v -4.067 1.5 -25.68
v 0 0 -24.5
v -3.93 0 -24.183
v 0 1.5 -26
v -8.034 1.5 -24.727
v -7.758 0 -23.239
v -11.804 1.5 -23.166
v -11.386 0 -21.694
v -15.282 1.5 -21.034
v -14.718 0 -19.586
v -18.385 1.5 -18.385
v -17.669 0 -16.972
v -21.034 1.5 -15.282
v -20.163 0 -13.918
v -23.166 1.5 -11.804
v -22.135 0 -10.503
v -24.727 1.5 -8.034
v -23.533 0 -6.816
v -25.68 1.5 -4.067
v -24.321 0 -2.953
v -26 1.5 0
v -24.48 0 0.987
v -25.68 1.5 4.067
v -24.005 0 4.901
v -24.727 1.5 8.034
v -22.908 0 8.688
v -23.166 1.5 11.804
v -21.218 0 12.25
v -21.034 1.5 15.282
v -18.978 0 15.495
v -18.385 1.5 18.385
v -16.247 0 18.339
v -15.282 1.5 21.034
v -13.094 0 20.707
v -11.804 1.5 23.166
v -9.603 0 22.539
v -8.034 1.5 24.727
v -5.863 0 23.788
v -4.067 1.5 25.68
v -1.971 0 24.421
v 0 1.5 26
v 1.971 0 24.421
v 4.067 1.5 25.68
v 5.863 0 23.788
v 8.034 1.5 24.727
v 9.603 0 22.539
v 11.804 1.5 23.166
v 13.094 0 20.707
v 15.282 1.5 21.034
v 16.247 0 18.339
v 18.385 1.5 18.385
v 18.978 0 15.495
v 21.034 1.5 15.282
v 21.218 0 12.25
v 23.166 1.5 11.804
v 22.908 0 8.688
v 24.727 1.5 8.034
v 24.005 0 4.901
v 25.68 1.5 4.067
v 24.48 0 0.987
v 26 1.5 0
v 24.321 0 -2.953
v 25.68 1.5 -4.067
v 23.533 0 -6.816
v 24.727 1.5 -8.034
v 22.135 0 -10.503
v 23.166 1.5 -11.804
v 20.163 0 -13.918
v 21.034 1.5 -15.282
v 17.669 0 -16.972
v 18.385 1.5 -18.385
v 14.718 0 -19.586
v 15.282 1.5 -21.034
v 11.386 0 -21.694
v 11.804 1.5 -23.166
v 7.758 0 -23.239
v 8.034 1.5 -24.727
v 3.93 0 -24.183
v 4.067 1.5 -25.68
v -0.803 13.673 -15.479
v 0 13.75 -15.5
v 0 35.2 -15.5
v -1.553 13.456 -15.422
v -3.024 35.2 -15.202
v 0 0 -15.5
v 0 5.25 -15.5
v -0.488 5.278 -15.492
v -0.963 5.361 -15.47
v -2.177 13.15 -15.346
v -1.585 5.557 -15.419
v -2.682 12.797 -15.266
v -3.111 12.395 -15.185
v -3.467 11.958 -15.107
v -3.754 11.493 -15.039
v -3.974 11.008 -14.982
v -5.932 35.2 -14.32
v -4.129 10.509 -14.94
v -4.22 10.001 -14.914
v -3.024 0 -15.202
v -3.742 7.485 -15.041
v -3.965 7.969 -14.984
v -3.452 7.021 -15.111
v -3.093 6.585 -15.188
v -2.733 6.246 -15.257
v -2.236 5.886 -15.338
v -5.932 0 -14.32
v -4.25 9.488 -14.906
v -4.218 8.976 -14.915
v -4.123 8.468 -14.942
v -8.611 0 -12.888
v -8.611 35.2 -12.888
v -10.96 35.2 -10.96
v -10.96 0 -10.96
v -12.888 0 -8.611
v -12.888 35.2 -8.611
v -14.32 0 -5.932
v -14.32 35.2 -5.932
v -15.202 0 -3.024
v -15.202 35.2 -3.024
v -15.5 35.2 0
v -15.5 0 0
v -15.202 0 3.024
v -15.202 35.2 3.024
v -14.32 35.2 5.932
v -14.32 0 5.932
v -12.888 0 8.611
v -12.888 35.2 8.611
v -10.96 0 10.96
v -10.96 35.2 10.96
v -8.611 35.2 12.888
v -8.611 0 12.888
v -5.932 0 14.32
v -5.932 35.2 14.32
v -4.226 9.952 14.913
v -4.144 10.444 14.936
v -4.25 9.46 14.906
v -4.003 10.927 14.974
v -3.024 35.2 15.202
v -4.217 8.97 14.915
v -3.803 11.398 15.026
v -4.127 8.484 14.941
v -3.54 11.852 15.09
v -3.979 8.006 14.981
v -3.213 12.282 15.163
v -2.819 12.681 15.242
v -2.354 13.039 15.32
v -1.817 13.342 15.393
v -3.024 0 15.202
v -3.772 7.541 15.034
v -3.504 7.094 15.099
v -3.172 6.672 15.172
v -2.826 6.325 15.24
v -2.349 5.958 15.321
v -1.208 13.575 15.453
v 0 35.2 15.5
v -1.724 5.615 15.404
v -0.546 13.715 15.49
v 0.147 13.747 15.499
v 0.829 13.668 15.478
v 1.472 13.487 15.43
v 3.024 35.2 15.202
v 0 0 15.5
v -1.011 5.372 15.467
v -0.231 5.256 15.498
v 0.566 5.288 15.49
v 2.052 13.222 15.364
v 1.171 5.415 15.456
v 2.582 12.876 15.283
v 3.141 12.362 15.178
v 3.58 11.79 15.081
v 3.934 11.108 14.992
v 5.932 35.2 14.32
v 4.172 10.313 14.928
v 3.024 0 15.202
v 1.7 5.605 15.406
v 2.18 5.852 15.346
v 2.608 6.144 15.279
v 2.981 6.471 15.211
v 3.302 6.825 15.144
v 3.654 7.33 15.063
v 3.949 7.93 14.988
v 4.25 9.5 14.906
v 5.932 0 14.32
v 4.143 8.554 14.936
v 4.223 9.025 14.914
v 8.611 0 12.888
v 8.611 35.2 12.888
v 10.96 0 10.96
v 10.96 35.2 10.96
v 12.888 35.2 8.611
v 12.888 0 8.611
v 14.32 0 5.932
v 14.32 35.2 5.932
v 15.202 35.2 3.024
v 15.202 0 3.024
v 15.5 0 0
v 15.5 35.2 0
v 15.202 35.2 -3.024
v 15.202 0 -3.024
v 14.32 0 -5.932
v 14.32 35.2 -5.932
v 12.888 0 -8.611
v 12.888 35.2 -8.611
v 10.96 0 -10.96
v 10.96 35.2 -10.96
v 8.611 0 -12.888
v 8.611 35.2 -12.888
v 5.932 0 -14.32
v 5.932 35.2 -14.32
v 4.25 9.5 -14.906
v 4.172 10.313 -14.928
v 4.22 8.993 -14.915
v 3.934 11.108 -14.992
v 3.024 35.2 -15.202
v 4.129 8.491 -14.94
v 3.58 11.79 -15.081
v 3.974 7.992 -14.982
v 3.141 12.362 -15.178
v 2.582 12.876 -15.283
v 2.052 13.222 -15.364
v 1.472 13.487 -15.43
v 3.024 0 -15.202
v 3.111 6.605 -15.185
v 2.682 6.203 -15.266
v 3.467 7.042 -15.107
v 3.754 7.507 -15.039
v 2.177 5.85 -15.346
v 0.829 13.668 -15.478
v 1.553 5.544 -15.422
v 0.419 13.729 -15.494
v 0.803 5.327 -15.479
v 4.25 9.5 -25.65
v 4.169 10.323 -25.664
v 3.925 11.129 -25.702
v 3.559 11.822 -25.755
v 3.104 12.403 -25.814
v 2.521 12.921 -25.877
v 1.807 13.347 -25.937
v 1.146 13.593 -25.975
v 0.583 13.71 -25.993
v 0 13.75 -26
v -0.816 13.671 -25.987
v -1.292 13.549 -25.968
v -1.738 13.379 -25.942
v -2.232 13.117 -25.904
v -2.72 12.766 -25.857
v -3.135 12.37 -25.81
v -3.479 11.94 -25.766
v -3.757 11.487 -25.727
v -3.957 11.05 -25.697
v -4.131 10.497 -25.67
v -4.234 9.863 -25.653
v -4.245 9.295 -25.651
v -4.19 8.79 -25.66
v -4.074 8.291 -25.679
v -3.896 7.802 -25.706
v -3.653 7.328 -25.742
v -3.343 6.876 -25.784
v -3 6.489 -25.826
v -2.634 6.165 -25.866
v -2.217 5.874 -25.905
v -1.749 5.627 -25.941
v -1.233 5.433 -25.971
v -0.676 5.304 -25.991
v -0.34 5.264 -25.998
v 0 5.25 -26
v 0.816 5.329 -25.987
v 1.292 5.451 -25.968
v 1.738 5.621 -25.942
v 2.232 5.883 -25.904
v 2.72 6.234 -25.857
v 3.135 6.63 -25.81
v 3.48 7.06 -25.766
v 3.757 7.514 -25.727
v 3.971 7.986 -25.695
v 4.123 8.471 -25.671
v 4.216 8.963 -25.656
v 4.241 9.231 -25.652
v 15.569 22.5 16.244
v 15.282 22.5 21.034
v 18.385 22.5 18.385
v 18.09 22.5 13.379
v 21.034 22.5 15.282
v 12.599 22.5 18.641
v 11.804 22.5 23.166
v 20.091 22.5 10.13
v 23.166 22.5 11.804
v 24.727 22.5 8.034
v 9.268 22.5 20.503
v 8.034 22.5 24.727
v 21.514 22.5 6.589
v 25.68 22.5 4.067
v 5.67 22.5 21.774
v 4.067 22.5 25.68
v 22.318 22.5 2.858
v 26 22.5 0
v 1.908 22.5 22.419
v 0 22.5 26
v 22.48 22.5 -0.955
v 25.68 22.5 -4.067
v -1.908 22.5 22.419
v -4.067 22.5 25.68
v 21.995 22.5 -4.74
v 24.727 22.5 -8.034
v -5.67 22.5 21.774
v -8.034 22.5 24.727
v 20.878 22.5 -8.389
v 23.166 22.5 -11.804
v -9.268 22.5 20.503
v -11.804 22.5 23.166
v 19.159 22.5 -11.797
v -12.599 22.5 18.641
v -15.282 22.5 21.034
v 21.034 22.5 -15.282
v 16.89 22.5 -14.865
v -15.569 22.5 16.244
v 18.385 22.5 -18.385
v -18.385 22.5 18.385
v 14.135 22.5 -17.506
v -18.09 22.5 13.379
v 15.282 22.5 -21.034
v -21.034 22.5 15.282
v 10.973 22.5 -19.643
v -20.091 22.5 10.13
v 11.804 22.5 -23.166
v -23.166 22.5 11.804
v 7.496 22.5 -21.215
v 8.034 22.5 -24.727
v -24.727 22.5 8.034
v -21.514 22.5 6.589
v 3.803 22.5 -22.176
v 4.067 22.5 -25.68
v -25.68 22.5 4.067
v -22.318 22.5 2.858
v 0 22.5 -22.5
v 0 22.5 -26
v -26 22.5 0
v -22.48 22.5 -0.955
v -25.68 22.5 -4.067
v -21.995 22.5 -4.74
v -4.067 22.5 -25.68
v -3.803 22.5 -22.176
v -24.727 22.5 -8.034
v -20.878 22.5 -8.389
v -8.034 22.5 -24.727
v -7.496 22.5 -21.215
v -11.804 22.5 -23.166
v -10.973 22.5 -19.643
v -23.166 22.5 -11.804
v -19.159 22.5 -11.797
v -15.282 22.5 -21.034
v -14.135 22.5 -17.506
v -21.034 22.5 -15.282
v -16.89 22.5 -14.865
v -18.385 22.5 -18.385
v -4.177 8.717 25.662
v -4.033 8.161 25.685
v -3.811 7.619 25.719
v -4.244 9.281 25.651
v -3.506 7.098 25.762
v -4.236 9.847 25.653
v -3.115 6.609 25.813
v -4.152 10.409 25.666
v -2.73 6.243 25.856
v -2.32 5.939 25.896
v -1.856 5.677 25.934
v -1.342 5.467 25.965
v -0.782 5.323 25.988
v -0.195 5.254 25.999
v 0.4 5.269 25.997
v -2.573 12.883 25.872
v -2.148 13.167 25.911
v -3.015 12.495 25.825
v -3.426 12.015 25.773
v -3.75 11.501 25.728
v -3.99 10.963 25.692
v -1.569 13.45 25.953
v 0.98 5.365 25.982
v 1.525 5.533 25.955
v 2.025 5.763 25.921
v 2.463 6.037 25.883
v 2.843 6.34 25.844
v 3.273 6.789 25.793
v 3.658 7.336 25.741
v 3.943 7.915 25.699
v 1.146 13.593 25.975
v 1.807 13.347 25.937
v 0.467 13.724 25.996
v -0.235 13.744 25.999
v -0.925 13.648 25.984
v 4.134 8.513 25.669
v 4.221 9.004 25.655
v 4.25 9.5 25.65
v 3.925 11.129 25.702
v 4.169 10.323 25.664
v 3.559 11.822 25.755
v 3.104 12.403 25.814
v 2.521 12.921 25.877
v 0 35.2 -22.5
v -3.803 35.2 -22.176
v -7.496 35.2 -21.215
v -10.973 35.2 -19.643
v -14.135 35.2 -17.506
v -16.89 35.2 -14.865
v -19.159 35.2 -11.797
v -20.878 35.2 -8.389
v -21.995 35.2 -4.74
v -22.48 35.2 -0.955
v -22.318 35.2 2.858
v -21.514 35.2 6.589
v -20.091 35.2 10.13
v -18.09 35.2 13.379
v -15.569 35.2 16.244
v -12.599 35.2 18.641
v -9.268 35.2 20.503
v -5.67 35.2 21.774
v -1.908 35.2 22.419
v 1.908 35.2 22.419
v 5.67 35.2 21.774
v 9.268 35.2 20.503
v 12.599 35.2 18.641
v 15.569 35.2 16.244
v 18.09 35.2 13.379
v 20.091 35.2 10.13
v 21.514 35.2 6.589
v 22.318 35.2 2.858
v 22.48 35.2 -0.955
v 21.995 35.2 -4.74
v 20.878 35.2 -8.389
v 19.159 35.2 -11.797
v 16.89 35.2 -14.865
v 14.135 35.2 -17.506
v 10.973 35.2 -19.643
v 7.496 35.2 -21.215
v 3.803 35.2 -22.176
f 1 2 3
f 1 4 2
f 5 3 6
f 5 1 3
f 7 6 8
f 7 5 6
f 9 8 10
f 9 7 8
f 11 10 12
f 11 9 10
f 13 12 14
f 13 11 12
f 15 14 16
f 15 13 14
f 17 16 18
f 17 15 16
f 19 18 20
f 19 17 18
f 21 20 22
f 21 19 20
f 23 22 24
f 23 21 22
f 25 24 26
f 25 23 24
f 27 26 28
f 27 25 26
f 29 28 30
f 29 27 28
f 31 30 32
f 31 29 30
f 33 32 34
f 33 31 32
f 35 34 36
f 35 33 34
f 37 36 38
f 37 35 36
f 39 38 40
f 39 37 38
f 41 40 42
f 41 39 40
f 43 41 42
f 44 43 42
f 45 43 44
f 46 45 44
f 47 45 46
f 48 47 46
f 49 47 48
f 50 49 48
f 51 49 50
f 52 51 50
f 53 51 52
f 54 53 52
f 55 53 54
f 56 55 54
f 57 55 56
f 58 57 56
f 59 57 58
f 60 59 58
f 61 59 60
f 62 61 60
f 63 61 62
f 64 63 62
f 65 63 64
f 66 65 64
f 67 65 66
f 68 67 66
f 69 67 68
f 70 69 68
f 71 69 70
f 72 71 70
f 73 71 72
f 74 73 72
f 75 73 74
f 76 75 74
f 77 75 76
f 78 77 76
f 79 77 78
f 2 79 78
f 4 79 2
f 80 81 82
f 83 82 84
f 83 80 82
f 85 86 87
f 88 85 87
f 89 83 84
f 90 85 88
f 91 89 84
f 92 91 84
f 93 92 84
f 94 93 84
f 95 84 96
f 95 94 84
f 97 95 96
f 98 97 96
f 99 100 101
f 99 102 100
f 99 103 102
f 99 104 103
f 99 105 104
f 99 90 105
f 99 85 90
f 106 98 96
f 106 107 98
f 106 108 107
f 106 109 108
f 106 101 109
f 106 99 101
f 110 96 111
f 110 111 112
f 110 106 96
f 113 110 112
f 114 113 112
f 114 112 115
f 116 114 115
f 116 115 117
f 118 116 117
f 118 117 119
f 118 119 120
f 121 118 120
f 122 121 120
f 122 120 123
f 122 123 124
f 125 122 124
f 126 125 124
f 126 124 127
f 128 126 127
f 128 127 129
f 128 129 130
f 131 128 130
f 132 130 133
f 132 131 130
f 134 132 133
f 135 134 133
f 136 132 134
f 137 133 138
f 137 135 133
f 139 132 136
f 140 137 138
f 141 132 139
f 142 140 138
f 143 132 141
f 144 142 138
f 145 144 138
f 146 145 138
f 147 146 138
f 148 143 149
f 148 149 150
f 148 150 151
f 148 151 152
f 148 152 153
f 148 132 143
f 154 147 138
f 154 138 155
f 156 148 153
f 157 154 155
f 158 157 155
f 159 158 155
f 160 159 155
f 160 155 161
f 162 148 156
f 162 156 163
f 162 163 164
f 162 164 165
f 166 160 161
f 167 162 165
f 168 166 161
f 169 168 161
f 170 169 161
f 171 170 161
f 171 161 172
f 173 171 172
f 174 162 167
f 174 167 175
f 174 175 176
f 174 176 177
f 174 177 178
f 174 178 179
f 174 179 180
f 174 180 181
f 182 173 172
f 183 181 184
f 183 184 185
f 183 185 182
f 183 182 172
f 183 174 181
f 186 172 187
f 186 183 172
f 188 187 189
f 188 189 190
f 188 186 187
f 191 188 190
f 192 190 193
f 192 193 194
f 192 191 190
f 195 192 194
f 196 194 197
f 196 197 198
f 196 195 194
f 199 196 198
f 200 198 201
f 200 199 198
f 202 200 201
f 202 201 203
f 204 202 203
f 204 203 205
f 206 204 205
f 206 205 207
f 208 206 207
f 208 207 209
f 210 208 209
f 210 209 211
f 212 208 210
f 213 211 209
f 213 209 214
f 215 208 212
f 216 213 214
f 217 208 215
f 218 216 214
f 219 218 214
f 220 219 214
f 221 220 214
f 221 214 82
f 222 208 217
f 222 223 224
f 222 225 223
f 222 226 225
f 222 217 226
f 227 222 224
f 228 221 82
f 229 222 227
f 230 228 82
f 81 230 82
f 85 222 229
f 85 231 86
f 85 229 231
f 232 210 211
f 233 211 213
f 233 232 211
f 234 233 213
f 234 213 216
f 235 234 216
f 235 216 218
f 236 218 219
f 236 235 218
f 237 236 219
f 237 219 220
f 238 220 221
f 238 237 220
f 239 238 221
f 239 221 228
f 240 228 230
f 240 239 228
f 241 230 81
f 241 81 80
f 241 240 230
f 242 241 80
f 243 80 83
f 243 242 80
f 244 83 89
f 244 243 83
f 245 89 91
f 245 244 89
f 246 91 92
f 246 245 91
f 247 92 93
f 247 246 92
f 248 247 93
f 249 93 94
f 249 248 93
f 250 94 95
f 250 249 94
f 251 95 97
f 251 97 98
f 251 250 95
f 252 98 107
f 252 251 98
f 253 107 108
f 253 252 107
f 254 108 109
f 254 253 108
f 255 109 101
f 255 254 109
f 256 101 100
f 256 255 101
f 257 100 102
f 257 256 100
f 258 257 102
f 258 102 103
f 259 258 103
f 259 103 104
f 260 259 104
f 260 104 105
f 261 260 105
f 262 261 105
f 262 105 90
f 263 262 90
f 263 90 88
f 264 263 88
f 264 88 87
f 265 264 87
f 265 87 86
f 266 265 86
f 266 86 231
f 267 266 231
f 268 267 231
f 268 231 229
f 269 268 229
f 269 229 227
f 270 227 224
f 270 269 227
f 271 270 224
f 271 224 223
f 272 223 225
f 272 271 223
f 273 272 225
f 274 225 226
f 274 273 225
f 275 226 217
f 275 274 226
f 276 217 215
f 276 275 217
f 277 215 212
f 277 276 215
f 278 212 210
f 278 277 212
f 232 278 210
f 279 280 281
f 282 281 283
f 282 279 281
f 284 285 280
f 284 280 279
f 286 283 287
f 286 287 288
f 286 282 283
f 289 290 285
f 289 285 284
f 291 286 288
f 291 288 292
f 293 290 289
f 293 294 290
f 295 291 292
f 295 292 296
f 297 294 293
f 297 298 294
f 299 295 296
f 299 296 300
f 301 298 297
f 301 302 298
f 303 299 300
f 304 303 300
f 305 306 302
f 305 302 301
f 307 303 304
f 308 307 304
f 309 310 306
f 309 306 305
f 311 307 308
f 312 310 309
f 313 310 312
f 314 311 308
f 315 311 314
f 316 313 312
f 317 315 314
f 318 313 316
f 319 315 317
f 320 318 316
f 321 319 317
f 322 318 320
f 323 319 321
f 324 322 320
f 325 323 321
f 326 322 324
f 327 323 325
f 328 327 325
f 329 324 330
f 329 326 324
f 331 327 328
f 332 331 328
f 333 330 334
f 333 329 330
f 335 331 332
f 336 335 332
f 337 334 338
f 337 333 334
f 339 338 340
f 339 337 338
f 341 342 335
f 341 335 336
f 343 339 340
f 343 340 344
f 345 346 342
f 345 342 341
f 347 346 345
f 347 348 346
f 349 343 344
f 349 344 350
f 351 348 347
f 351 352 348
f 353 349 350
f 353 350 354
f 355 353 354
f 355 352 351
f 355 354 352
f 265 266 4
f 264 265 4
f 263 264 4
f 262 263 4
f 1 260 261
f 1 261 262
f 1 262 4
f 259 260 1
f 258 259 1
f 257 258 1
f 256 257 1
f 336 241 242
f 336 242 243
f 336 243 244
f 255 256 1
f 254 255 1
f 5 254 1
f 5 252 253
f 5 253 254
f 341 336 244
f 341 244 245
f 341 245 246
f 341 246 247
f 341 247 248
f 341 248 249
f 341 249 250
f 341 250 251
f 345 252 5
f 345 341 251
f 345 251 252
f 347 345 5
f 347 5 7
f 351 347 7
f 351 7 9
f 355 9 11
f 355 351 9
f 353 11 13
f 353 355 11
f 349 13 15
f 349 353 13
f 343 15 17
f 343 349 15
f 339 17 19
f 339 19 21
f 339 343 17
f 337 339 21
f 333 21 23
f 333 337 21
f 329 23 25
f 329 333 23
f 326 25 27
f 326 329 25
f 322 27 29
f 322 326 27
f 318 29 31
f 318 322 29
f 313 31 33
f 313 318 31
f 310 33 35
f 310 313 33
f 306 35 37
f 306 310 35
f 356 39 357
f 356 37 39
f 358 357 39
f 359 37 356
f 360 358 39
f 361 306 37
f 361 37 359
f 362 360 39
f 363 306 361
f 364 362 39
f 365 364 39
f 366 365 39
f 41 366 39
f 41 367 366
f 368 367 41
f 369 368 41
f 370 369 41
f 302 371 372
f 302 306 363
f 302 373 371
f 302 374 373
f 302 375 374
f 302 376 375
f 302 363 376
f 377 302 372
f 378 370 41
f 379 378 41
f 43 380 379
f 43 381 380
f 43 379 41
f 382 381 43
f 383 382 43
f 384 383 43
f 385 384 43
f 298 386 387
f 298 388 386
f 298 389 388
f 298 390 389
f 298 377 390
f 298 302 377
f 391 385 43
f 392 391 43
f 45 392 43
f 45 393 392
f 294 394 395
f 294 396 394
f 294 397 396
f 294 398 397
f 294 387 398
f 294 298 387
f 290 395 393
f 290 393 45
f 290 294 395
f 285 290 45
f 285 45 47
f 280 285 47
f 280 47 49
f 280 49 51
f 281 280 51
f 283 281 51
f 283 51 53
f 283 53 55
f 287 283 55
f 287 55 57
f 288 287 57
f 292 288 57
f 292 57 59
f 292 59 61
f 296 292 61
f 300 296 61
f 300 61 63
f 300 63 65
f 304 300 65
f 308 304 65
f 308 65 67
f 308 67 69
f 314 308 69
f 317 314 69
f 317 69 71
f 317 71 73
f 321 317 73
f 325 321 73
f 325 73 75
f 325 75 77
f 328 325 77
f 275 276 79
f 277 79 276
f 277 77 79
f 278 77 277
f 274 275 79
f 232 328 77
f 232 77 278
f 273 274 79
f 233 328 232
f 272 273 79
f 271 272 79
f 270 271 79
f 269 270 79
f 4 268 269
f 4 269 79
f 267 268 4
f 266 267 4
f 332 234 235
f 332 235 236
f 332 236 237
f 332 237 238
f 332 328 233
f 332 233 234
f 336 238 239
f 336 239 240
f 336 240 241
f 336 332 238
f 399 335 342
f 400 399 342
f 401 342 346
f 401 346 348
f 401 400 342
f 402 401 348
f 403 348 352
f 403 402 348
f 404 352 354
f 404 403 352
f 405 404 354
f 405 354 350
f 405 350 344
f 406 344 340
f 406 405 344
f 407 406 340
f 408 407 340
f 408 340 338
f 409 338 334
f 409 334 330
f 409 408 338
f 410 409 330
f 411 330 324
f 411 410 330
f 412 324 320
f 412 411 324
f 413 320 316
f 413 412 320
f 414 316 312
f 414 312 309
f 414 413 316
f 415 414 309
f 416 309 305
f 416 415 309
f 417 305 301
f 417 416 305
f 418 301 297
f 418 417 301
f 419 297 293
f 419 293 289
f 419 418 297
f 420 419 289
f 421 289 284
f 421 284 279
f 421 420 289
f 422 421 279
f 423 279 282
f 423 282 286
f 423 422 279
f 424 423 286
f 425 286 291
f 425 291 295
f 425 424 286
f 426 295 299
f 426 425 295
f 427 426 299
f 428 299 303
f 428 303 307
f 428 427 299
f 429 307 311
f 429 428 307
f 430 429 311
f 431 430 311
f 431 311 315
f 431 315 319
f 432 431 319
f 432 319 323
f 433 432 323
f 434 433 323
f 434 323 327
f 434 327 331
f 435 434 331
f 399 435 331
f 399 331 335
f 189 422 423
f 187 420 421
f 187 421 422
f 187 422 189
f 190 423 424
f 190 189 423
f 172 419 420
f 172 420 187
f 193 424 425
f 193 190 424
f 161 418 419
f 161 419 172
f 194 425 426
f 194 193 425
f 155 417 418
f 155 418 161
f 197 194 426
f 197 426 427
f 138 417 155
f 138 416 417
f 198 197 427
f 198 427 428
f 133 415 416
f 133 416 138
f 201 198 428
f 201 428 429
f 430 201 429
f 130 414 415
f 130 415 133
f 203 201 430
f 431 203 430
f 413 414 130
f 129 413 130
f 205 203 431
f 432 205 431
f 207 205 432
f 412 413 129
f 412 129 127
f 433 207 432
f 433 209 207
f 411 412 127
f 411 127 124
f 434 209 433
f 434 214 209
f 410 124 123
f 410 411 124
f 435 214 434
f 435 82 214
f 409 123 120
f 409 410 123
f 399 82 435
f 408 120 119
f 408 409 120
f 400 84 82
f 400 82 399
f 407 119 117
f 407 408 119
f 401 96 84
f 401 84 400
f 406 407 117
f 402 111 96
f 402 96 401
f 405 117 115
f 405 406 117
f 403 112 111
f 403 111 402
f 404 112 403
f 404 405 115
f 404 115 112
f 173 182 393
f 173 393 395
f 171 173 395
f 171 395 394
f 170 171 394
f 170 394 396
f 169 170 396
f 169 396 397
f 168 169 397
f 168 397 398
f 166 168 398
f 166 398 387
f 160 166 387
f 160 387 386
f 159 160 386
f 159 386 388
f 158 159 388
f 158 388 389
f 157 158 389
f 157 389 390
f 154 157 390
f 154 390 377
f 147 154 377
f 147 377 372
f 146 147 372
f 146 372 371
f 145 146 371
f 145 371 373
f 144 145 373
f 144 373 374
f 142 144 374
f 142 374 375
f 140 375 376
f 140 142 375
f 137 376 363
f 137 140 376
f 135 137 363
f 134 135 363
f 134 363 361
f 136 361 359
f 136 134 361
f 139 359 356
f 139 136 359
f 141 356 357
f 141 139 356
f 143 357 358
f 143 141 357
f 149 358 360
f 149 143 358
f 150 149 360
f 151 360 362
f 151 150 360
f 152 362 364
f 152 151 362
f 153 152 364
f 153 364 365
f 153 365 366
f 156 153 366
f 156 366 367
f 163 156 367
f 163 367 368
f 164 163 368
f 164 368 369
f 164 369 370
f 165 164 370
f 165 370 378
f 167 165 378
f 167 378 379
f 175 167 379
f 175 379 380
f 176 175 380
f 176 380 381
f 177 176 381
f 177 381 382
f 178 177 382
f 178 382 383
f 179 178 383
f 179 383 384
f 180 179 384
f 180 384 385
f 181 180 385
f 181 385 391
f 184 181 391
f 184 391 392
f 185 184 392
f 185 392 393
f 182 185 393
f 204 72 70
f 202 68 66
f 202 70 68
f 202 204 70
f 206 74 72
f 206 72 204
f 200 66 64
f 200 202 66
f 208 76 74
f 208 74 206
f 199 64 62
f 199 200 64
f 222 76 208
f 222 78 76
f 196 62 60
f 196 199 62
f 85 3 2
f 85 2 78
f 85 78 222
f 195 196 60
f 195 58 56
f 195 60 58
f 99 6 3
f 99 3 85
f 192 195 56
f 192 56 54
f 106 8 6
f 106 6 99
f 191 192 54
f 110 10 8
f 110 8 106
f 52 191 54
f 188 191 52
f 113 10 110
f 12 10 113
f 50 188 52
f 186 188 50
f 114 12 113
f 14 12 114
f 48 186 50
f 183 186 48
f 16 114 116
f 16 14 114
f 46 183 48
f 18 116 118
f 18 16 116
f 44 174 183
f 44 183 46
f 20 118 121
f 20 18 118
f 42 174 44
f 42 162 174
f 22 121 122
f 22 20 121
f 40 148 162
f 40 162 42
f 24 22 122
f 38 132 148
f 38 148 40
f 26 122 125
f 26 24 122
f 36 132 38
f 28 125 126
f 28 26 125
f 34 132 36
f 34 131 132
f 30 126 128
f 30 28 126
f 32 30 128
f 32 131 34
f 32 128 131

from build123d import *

# Parameters (mm, degrees)
CORTE_EXTRUS_O1_DEPTH      = 51.902259282
CORTE_EXTRUS_O1_DEPTH_BACK = 51.902259282
ESBO_O2_R                  = 4.25


with BuildPart() as part:
    # Esboço1 → Revolução1 (revolve)
    with BuildSketch(Plane(origin=(0, 0, 0), x_dir=(0, 0, -1), z_dir=(1, 0, 0))):
        Polygon((15.5, 35.2), (15.5, 0), (24.5, 0), (26, 1.5), (26, 22.5), (22.5, 22.5), (22.5, 35.2), align=None)
    revolve(axis=Axis((0, 0, 0), (0, 1, 0)))

    # Esboço2 → Corte-extrusão1 (cut, two sides: drawn at the far end of the back side and taken through both)
    with BuildSketch(Plane.XY.offset(-CORTE_EXTRUS_O1_DEPTH_BACK)):
        with Locations((0, 9.5)):
            Circle(ESBO_O2_R)
    extrude(amount=CORTE_EXTRUS_O1_DEPTH + CORTE_EXTRUS_O1_DEPTH_BACK, mode=Mode.SUBTRACT)


solid = part.part
